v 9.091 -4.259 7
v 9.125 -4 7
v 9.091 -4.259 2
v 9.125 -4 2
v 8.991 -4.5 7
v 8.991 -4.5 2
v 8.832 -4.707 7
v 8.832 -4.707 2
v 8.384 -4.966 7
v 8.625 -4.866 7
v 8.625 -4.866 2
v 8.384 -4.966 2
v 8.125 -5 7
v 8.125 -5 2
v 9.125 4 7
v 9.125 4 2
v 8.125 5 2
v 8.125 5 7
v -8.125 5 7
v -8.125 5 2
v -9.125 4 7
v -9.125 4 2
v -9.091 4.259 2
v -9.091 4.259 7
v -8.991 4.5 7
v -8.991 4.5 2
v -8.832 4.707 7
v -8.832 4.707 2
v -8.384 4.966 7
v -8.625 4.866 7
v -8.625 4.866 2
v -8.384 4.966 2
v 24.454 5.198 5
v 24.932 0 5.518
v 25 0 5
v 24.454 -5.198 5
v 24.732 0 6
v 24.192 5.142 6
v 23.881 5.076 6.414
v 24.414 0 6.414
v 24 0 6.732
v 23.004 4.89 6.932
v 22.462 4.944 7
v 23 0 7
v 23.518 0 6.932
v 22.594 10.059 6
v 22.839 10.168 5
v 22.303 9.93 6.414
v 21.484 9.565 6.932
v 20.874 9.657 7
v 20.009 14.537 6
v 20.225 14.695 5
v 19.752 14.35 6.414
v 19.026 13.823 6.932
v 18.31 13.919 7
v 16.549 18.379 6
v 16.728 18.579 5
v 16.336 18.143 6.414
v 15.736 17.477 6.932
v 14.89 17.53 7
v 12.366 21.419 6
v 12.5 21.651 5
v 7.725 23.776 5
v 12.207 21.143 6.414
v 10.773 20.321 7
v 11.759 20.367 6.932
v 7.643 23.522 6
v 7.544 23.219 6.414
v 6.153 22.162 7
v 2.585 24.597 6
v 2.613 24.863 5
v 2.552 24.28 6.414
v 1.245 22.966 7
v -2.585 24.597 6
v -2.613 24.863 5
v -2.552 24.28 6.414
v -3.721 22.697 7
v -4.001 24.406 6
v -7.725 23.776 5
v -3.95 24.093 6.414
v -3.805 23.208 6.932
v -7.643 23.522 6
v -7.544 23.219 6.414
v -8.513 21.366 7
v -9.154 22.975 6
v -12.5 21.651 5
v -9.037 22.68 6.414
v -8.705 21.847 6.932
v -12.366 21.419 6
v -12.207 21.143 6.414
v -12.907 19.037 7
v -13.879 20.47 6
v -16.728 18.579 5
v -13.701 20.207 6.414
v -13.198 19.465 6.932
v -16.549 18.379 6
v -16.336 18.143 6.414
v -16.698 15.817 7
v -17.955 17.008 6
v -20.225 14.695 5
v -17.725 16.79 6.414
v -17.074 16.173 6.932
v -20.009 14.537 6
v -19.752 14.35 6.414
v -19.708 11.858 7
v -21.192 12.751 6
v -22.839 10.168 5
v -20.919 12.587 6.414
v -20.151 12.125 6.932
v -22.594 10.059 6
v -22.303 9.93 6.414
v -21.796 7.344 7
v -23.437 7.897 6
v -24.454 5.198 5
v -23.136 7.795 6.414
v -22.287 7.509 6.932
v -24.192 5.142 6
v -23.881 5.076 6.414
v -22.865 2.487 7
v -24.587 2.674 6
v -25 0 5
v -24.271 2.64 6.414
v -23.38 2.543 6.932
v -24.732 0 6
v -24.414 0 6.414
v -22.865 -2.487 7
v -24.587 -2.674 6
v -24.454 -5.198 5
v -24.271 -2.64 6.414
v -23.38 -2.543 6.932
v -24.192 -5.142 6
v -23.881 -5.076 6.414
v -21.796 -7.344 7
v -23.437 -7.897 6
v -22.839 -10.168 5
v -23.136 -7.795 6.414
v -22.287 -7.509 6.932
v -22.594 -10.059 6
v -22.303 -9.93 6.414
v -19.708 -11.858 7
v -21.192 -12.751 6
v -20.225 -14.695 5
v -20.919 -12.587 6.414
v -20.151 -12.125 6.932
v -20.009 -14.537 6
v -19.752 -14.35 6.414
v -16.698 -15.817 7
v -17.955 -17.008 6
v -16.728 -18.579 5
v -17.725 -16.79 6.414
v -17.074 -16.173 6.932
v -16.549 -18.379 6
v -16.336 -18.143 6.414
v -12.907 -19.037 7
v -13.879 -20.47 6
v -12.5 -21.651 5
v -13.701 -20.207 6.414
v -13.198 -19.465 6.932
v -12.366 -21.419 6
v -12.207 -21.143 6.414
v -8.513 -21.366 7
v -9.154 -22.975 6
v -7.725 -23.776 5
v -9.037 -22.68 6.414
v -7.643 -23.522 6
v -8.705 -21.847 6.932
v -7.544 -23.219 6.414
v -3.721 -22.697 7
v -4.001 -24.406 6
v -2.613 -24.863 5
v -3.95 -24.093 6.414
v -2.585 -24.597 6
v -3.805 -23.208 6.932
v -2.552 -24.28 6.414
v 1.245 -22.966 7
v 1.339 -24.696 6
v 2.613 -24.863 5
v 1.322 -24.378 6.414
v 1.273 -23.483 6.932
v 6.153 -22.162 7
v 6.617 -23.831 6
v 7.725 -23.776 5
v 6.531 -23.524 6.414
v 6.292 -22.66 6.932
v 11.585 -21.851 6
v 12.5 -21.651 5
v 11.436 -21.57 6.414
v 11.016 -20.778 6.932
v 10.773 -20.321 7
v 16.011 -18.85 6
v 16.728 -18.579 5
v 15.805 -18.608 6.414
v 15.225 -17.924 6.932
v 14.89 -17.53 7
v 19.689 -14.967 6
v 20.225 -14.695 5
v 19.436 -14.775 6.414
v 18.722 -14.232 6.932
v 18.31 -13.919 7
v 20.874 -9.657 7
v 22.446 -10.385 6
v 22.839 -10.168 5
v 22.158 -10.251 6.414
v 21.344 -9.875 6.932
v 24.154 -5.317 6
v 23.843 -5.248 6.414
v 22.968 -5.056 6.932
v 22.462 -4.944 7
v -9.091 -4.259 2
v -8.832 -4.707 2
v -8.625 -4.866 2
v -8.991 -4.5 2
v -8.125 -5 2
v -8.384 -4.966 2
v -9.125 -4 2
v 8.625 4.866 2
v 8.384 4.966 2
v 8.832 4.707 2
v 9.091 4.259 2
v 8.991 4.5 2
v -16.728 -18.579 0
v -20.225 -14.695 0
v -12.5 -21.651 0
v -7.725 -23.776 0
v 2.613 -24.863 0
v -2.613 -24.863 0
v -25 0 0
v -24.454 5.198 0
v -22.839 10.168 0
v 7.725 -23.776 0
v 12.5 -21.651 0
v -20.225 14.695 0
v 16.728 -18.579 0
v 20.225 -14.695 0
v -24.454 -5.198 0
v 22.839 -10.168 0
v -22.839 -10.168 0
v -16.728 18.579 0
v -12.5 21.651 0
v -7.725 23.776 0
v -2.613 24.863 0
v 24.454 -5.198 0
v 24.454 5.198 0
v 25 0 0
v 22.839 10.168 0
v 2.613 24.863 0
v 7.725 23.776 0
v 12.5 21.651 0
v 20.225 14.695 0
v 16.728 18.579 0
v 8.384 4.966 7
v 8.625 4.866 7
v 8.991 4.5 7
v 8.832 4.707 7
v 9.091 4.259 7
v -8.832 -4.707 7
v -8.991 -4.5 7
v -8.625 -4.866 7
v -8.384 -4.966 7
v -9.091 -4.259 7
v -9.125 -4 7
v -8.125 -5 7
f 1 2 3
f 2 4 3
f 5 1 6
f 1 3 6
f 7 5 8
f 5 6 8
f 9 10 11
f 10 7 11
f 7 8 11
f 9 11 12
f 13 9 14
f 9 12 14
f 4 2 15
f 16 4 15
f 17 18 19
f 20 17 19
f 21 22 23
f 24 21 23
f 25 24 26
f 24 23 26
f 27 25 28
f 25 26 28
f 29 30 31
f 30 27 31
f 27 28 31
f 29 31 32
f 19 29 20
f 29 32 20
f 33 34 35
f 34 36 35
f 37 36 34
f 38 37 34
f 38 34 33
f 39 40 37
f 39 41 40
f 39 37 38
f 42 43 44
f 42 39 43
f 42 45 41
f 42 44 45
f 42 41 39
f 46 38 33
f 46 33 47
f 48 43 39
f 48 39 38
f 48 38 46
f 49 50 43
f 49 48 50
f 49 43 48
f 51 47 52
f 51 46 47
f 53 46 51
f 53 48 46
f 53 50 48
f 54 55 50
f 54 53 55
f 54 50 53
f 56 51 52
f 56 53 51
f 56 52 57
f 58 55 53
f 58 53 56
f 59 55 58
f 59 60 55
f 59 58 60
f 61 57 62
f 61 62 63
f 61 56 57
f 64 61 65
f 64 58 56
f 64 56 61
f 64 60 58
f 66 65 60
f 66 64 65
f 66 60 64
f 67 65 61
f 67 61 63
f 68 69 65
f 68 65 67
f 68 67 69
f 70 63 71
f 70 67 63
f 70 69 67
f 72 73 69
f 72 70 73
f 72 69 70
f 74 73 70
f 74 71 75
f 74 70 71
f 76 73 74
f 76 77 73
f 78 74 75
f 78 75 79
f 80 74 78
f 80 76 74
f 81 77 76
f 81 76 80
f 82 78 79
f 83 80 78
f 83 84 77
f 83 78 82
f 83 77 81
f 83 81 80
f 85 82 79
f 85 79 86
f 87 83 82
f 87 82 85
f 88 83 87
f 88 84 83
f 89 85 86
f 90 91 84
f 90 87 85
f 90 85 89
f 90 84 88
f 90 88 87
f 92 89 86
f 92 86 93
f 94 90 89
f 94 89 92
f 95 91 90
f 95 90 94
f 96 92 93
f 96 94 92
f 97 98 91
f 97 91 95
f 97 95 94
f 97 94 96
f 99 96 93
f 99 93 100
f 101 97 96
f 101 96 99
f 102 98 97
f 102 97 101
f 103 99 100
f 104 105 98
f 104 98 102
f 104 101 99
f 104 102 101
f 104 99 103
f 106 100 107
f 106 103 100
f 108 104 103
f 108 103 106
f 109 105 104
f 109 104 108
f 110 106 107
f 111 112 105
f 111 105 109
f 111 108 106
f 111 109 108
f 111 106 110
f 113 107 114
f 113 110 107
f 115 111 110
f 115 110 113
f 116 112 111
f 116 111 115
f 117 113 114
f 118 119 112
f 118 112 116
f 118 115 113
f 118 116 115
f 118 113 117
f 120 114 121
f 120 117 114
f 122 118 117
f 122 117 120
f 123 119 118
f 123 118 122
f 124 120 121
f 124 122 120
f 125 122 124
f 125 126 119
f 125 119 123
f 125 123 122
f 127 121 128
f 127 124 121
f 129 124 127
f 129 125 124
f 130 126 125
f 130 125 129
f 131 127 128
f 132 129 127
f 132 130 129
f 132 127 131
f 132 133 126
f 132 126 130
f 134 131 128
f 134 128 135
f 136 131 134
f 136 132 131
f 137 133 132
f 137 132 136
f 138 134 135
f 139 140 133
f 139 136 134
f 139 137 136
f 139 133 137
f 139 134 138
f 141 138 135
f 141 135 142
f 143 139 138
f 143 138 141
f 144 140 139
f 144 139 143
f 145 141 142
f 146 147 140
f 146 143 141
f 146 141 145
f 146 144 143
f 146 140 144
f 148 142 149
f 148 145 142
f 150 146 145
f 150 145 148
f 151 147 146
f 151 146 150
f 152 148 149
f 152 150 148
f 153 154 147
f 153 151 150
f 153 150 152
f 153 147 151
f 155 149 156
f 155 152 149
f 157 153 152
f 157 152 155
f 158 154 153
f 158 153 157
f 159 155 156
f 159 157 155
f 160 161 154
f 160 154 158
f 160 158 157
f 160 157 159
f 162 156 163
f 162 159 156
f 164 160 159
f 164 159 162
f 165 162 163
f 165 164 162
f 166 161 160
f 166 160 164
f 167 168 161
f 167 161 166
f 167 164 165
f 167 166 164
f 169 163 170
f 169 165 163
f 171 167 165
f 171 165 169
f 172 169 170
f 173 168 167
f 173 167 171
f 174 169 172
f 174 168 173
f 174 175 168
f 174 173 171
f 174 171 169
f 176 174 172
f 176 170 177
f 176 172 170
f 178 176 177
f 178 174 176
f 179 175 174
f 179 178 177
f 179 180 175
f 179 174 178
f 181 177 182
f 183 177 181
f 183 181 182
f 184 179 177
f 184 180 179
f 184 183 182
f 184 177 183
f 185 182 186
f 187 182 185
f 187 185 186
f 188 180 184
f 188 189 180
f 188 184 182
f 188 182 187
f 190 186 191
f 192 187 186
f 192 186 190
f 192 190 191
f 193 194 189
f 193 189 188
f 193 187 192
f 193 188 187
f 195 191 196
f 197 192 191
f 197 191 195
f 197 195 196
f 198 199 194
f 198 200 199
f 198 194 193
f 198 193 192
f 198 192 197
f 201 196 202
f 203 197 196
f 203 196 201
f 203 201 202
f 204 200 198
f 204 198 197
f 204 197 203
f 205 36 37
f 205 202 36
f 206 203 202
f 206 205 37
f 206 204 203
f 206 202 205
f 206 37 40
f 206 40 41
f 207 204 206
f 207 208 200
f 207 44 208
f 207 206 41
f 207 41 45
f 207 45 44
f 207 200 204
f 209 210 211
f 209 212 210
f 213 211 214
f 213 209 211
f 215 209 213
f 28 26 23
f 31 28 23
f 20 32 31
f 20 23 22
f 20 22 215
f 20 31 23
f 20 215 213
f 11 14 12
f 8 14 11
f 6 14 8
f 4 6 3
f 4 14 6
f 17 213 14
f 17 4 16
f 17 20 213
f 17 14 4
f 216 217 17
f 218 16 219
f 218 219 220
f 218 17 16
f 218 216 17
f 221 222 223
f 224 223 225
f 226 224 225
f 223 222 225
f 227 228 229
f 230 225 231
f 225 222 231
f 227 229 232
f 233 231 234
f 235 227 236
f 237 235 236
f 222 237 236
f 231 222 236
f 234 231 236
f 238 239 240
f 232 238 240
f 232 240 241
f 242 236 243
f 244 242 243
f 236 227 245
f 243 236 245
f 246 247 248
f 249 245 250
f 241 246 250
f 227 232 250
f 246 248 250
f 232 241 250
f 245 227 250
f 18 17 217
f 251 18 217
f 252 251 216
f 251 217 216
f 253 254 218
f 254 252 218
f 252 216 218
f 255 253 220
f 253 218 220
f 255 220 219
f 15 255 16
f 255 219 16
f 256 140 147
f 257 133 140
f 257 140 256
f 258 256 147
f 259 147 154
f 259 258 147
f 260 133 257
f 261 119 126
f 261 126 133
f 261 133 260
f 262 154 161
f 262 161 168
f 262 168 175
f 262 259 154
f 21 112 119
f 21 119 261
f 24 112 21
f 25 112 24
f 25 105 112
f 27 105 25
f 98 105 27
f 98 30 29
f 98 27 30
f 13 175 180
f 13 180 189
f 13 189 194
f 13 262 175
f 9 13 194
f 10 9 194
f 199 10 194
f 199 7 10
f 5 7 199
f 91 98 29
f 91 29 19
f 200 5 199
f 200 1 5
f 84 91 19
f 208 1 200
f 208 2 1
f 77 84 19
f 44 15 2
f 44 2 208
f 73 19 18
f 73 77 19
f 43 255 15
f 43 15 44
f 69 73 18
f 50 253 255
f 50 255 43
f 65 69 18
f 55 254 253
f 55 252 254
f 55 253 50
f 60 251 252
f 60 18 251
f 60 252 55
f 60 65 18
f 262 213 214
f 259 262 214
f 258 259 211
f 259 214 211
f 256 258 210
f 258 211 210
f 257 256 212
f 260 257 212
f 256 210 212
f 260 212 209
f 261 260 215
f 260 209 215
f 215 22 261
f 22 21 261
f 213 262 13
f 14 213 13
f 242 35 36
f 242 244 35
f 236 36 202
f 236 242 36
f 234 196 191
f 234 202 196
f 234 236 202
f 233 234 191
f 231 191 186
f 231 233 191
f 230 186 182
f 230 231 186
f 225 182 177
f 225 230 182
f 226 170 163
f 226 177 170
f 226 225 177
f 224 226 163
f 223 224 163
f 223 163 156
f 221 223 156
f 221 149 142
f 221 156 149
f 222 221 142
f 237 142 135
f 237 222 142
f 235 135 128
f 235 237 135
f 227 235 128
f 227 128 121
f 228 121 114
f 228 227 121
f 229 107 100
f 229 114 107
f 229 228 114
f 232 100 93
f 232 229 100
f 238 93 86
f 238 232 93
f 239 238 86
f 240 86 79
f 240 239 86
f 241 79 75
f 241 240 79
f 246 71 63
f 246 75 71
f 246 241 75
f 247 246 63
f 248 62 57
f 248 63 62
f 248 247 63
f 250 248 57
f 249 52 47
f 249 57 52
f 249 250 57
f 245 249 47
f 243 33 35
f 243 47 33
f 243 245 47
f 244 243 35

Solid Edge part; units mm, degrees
sketch "Sketch1" plane through (0, 0, 0) normal (0, 0, 1) x (1, 0, 0)
  circle A0 centre (0, 0) radius 25
  dimension "D1" = 50
extrude "Protrusion1" add sketch "Sketch1" along normal blind 7
sketch "Sketch2" plane through (0, 0, 7) normal (0, 0, 1) x (1, 0, 0)
  line L0 (-9.125, -5) -> (9.125, -5)
  line L1 (9.125, -5) -> (9.125, 5)
  line L2 (9.125, 5) -> (-9.125, 5)
  line L3 (-9.125, 5) -> (-9.125, -5)
  dimension "D1" = 18.25
  dimension "D2" = 10
extrude "Utskärning_för_pelare" cut sketch "Sketch2" against normal blind 5
fillet "Avrundning_utsida" radius 2 1 edges at (-25, 0, 7)
fillet "Avrundning_insida" radius 1 4 edges at (-9.125, 5, 4.5) (9.125, 5, 4.5) (-9.125, -5, 4.5) (9.125, -5, 4.5)
